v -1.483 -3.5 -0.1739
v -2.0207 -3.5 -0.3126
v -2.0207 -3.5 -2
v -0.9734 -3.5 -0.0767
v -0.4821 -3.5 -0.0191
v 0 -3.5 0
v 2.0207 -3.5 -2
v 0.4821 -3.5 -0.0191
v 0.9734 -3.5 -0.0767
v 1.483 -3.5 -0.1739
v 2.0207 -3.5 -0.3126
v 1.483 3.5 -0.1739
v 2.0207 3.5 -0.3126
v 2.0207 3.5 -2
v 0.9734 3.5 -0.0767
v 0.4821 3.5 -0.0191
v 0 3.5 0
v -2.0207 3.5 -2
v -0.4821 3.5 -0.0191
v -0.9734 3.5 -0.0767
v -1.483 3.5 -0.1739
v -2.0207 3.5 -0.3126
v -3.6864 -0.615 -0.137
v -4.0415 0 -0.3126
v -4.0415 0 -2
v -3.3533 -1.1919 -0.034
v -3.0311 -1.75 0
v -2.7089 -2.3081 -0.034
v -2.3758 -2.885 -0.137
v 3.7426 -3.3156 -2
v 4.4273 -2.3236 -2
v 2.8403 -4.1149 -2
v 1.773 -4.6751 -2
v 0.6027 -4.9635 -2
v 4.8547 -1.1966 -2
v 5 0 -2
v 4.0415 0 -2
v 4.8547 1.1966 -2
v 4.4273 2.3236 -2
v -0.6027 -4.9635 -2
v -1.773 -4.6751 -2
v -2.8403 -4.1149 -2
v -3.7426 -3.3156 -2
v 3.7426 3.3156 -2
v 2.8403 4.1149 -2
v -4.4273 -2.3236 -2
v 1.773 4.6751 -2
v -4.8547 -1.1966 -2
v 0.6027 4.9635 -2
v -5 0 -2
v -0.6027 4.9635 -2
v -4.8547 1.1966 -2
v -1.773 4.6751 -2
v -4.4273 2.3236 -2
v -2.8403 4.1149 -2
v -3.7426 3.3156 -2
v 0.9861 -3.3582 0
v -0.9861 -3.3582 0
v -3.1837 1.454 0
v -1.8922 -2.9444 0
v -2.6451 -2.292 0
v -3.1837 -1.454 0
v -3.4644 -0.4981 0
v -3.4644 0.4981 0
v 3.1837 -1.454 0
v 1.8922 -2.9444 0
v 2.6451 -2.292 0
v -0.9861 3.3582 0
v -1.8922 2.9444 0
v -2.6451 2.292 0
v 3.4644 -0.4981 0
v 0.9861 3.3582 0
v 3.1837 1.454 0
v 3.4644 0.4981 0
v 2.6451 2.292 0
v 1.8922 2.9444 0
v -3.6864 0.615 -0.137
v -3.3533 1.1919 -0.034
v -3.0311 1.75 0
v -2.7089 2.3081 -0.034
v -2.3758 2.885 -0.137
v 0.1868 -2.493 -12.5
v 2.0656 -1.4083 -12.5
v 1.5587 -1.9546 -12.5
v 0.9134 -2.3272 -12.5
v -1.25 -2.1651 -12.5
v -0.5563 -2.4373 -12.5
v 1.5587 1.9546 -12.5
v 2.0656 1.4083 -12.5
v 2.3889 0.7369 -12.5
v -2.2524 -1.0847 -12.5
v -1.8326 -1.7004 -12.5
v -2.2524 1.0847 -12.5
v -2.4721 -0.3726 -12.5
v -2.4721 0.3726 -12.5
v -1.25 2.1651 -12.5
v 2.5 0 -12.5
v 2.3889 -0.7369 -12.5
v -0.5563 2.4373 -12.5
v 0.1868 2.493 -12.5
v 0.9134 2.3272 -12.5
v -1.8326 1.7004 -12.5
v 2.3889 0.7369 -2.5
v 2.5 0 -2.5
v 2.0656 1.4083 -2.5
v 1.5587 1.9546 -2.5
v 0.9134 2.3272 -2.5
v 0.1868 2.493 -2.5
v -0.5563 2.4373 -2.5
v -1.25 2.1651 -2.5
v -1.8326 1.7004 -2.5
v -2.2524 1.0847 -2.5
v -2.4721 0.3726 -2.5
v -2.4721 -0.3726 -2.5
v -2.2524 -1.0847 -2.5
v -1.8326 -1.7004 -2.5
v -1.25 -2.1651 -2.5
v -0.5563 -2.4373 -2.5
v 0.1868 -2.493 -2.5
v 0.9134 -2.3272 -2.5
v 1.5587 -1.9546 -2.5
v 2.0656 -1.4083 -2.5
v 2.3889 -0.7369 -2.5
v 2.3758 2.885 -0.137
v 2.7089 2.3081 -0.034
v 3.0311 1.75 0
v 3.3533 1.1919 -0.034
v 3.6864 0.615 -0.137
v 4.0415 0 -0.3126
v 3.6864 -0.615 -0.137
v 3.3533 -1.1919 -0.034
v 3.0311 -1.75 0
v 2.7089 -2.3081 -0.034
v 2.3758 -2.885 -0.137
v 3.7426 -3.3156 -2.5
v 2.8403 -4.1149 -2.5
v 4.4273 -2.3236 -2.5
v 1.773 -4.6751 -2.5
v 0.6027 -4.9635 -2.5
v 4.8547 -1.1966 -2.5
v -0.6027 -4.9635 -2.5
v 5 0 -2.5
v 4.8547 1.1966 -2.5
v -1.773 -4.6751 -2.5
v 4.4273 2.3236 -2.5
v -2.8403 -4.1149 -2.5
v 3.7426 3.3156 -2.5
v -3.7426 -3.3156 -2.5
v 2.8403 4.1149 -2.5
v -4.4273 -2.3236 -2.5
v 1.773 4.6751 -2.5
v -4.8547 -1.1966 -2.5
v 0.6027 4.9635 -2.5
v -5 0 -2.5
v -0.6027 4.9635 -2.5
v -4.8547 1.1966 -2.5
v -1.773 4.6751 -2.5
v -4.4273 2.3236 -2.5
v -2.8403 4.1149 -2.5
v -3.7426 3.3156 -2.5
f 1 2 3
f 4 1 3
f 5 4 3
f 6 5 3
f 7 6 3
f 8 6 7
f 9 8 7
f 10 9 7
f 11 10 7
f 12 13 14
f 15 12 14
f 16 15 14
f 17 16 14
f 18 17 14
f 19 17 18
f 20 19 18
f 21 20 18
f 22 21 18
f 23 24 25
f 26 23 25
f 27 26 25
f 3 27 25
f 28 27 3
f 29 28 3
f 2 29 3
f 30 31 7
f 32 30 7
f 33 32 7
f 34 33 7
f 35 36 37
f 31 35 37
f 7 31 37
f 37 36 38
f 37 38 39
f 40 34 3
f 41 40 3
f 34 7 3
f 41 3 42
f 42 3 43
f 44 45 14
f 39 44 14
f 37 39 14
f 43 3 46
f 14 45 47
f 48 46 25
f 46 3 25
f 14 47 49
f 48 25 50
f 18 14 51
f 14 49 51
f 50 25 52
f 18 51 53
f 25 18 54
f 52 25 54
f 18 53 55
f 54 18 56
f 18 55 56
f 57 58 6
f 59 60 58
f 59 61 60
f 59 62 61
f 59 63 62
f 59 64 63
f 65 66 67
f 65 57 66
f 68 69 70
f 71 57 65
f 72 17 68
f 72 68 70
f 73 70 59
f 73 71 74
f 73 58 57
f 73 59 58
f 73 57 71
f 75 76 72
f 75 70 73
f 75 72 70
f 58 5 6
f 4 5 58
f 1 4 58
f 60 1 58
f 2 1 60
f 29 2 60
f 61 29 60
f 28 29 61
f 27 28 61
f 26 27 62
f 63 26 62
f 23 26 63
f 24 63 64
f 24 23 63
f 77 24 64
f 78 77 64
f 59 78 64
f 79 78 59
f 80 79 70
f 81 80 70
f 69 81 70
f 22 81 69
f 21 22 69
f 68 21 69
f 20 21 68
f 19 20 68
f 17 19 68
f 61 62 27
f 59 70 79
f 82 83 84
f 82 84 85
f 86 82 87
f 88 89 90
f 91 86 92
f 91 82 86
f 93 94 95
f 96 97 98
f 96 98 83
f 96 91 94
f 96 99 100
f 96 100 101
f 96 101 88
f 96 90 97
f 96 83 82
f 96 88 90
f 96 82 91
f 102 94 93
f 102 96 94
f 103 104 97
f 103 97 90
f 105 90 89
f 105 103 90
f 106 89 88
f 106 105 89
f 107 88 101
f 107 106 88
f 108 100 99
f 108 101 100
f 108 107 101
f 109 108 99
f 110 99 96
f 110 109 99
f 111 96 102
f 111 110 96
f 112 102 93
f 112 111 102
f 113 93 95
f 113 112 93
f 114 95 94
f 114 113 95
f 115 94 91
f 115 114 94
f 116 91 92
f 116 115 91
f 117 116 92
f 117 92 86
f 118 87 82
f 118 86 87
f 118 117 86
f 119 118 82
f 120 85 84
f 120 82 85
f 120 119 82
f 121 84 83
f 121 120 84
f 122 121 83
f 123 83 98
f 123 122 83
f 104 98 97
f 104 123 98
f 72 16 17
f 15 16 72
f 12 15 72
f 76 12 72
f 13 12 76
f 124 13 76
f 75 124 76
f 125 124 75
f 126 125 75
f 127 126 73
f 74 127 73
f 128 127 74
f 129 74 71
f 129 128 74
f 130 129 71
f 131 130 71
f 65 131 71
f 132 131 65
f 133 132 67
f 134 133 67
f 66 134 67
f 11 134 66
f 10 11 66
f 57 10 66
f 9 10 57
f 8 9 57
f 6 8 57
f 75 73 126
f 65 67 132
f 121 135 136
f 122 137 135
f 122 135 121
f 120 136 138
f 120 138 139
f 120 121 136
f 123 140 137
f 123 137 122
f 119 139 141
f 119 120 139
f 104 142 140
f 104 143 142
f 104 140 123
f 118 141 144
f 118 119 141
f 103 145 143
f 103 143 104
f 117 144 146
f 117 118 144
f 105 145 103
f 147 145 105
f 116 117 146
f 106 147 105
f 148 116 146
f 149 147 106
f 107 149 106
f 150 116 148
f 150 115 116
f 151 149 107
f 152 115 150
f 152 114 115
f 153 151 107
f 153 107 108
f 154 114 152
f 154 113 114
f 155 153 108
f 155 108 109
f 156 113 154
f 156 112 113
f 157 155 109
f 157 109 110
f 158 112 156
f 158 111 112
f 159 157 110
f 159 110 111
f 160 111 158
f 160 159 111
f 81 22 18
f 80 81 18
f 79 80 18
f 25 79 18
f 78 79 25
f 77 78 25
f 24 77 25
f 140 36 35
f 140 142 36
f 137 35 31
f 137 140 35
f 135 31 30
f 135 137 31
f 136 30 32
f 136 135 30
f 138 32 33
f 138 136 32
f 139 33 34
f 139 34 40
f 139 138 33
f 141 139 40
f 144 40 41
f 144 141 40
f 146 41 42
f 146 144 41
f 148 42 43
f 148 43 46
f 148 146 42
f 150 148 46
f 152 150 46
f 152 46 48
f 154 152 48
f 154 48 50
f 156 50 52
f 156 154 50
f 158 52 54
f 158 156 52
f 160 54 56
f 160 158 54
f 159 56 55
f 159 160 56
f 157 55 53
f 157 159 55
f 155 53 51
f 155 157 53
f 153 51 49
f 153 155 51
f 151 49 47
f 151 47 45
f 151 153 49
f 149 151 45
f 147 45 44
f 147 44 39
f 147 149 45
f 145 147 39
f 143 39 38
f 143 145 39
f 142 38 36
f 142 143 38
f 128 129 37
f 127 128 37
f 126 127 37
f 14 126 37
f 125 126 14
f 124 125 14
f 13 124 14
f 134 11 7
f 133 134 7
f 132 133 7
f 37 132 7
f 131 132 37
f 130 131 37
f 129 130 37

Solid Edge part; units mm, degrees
sketch "Sketch1" plane through (0, 0, 0) normal (0, 0, 1) x (1, 0, 0)
  line L0 (2.0207, 3.5) -> (-2.0207, 3.5)
  line L1 (-2.0207, 3.5) -> (-4.0415, 0)
  line L2 (-4.0415, 0) -> (-2.0207, -3.5)
  line L3 (-2.0207, -3.5) -> (2.0207, -3.5)
  line L4 (2.0207, -3.5) -> (4.0415, 0)
  line L5 (4.0415, 0) -> (2.0207, 3.5)
extrude "Protrusion1" add sketch "Sketch1" against normal blind 2.5
sketch "Sketch2" plane through (19.7841, 16.7997, -2.5) normal (0, 0, -1) x (1, 0, 0)
  circle A0 centre (-19.7841, 16.7997) radius 5
extrude "ExtrudedProtrusion_2" add sketch "Sketch2" against normal blind 0.5
sketch "Sketch3" plane through (19.7841, 16.7997, -2.5) normal (0, 0, -1) x (1, 0, 0)
  circle A0 centre (-19.7841, 16.7997) radius 2.5
extrude "ExtrudedProtrusion_3" add sketch "Sketch3" along normal blind 10
sketch "Sketch4" plane through (0, 0, 0) normal (0, -1, 0) x (1, 0, 0)
  line L0 (3.5, 0) -> (4.0415, 0)
  line L1 (4.0415, 0) -> (4.0415, -0.3126)
  line L2 (4.0415, -0.3126) -> (3.5, 0)
  dimension "D1" = 3.5
revolve "RevolvedCutout1" cut sketch "Sketch4" angle 360 about axis through (0, 0, 54) along (0, 0, -1)
